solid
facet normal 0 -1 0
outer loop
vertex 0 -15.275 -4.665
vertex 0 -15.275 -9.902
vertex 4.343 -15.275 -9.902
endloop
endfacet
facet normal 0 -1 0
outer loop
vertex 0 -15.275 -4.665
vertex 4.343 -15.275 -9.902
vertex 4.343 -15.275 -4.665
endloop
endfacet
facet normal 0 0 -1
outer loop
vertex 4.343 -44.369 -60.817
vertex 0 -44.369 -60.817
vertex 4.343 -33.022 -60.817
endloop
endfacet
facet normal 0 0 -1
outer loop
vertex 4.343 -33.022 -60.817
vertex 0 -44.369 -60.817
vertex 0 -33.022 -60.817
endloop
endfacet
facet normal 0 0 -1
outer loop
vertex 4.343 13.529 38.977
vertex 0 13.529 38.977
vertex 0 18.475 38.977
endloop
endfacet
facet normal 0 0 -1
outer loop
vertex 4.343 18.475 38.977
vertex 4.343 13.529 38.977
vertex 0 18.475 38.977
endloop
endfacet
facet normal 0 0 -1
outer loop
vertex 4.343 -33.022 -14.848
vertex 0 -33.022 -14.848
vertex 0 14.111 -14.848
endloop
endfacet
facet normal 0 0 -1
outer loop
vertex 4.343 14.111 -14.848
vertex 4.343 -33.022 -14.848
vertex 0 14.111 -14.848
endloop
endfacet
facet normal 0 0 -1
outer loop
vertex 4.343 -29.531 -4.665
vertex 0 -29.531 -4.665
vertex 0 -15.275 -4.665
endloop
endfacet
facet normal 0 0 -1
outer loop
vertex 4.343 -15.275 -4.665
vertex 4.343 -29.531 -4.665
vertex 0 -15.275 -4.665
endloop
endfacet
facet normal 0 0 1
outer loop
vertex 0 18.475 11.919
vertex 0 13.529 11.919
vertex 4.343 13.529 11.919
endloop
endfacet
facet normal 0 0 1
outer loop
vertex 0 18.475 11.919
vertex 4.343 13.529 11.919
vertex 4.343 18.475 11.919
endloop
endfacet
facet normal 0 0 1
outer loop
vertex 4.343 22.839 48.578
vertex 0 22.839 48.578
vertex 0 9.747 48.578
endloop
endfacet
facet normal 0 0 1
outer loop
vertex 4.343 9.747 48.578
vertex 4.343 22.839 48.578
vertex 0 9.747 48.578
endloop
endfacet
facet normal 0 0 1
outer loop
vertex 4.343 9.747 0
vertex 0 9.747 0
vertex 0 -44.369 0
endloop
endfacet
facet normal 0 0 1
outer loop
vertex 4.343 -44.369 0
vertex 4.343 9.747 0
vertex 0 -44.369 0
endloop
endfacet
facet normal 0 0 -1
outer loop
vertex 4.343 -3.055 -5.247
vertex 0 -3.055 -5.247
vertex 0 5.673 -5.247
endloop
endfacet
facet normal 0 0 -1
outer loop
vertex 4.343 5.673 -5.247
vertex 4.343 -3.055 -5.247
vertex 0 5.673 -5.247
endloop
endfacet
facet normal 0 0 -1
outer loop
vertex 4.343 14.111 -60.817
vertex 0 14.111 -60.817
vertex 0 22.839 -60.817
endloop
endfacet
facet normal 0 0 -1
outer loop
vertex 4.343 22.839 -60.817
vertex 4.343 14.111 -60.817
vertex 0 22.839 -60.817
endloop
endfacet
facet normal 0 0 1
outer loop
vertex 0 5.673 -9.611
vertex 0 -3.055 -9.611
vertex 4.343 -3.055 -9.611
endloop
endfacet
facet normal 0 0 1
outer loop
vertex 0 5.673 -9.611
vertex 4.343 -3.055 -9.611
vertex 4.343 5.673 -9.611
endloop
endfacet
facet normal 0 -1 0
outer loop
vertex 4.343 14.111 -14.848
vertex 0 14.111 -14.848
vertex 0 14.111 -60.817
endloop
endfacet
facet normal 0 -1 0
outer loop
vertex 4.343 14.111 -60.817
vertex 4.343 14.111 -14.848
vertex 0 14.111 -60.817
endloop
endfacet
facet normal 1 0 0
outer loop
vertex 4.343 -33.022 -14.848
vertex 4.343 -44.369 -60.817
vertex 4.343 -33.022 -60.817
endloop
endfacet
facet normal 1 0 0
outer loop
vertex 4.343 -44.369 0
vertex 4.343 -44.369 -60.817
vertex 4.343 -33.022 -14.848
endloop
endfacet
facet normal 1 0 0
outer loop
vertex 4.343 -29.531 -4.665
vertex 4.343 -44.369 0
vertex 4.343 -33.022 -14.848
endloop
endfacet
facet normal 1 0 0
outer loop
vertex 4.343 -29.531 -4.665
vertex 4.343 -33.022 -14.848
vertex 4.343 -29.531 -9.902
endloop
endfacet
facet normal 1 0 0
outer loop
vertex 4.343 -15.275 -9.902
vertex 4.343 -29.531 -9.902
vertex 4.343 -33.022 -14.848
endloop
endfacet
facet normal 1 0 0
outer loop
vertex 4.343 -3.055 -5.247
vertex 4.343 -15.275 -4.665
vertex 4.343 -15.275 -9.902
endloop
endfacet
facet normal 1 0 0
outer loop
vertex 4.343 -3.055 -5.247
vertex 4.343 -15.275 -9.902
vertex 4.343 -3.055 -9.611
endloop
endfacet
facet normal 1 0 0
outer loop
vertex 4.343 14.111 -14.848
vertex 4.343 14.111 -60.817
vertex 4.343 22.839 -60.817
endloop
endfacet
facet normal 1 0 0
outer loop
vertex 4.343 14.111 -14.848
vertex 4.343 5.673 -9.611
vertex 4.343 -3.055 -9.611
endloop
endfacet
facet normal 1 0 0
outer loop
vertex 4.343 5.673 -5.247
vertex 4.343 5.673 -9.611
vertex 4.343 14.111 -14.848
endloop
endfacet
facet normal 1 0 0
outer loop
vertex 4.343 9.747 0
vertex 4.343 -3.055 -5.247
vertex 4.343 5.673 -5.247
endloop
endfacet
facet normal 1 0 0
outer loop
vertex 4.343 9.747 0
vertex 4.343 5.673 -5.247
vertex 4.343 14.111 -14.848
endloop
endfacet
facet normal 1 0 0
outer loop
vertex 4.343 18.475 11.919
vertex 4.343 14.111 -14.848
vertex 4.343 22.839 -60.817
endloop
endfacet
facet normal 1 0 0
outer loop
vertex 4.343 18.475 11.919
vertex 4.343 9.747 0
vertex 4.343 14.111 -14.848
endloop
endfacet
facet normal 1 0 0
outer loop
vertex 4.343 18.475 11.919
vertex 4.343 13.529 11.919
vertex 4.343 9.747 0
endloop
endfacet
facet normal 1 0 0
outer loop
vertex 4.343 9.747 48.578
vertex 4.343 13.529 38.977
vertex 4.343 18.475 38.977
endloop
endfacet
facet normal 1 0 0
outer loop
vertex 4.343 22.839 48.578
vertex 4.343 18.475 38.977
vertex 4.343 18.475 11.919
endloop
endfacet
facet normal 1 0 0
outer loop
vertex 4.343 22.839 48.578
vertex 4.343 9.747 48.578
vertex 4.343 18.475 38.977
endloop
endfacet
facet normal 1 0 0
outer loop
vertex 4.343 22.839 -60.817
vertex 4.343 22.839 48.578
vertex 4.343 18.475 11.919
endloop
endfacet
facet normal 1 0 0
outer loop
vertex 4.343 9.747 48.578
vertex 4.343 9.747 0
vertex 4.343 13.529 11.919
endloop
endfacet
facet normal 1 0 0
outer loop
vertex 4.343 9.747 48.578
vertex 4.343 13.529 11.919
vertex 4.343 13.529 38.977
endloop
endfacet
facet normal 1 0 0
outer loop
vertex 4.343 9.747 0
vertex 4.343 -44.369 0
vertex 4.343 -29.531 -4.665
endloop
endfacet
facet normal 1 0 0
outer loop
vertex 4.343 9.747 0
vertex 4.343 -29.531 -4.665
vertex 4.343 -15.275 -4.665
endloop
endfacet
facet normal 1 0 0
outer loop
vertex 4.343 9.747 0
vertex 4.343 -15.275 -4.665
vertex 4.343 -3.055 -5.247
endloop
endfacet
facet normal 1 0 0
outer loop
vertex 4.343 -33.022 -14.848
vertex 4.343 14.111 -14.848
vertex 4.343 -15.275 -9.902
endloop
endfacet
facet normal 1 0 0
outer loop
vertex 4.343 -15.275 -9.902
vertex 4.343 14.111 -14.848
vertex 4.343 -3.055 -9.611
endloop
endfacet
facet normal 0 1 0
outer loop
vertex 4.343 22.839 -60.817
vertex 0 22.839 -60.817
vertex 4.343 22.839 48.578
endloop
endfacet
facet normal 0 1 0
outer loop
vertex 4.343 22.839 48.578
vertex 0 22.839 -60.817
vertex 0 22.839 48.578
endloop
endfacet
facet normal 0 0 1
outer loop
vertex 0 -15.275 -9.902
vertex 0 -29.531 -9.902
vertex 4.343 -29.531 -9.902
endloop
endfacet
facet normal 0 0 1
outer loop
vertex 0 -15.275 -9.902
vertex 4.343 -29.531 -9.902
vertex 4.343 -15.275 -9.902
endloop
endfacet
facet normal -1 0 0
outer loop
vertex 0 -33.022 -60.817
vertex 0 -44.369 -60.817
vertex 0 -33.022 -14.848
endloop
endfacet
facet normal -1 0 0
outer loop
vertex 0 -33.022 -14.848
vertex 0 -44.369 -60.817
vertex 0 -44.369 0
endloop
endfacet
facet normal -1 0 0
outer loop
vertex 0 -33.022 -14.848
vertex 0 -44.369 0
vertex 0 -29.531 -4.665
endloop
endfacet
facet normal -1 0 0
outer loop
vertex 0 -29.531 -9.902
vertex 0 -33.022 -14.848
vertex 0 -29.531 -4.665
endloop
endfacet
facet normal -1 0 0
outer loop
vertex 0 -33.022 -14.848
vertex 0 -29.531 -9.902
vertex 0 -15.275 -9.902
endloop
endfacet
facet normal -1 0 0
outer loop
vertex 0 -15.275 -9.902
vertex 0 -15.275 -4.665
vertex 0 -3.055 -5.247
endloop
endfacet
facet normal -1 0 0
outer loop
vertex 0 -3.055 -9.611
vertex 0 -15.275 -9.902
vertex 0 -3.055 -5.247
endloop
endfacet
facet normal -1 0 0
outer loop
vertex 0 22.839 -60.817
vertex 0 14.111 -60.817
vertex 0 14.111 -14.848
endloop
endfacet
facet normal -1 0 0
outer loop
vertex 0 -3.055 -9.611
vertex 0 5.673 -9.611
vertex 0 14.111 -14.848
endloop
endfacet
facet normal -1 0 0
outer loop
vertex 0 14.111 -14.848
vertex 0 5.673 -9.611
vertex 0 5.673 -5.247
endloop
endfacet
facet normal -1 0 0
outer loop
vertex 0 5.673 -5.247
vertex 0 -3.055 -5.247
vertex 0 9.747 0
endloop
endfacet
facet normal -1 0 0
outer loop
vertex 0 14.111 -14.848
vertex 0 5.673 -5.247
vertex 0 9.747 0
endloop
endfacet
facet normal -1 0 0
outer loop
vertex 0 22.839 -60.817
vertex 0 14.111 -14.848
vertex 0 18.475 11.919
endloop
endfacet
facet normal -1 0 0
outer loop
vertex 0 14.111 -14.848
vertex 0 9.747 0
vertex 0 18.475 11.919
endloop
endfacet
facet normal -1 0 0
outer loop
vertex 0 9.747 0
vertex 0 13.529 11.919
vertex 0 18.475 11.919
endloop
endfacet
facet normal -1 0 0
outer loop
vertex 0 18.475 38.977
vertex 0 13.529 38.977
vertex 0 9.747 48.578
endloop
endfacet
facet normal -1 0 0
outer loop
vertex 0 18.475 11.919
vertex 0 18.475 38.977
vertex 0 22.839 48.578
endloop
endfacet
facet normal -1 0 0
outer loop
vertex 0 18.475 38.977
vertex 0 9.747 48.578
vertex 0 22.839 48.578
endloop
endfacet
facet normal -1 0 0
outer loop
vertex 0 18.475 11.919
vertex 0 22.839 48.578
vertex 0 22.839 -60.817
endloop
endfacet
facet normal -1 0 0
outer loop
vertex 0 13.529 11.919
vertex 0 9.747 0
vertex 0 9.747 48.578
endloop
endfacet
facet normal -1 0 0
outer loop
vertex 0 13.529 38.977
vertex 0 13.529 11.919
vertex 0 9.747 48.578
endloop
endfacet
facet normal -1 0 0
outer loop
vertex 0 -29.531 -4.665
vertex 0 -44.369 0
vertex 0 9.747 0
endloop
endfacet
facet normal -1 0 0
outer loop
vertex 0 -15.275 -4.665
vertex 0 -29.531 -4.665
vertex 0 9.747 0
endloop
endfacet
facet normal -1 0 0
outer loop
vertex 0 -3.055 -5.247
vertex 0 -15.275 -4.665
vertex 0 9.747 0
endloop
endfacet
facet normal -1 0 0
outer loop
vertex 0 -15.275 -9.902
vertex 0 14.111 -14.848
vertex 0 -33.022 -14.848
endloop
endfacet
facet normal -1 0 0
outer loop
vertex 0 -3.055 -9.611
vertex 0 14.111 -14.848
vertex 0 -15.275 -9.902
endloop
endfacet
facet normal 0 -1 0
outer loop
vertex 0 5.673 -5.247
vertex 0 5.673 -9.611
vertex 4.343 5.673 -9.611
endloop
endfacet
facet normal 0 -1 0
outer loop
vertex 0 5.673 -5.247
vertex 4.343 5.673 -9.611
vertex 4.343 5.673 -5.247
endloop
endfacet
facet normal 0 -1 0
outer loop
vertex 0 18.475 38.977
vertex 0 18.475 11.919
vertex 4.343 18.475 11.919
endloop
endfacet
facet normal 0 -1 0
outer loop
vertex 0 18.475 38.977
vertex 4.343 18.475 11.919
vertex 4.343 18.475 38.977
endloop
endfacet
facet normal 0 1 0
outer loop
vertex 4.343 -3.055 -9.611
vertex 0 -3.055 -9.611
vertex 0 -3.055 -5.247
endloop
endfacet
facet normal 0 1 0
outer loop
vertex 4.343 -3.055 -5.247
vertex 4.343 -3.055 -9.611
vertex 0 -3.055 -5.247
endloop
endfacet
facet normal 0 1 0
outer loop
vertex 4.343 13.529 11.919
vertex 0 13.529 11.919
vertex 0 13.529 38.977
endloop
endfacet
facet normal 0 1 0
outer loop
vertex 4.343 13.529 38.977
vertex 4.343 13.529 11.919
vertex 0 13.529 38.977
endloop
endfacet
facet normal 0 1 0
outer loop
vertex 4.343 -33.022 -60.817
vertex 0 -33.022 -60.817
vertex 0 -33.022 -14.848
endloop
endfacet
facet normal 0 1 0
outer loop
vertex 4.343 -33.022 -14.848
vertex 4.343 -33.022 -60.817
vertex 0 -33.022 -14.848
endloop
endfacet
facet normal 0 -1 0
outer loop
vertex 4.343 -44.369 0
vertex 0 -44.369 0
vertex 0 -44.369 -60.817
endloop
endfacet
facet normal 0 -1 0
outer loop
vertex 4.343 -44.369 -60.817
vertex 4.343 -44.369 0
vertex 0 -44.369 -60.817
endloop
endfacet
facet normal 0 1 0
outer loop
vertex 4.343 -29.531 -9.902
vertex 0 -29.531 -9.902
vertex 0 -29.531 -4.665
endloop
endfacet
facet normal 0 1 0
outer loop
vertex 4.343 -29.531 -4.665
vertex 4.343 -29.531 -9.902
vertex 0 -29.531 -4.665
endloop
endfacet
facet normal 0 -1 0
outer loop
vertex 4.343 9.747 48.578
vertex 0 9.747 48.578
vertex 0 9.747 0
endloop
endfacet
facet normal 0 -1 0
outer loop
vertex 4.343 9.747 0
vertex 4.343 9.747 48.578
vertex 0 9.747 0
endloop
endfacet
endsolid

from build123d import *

# Parameters (mm, degrees)
F0_W     = 14.256329
F0_H     = 5.237018
F0_W_2   = 8.728366
F0_H_2   = 4.364182
F0_W_3   = 4.946071
F0_H_3   = 27.057927
F1_DEPTH = 4.3434


with BuildPart() as f1:
    # F0 (on Right) → F1 (new body)
    with BuildSketch(Plane.YZ):
        Polygon((22.83922, -60.81732), (22.83922, 48.578169), (9.746672, 48.578169), (9.746672, 0), (-44.369183, 0), (-44.369183, -60.81732), (-33.022311, -60.81732), (-33.022311, -14.847939), (14.110854, -14.847939), (14.110854, -60.81732), align=None)
        with Locations((-22.4028, -7.283357)):
            Rectangle(F0_W, F0_H, mode=Mode.SUBTRACT)
        with Locations((1.309254, -7.428829)):
            Rectangle(F0_W_2, F0_H_2, mode=Mode.SUBTRACT)
        with Locations((16.002, 25.448007)):
            Rectangle(F0_W_3, F0_H_3, mode=Mode.SUBTRACT)
    extrude(amount=F1_DEPTH)


solid = f1.part
